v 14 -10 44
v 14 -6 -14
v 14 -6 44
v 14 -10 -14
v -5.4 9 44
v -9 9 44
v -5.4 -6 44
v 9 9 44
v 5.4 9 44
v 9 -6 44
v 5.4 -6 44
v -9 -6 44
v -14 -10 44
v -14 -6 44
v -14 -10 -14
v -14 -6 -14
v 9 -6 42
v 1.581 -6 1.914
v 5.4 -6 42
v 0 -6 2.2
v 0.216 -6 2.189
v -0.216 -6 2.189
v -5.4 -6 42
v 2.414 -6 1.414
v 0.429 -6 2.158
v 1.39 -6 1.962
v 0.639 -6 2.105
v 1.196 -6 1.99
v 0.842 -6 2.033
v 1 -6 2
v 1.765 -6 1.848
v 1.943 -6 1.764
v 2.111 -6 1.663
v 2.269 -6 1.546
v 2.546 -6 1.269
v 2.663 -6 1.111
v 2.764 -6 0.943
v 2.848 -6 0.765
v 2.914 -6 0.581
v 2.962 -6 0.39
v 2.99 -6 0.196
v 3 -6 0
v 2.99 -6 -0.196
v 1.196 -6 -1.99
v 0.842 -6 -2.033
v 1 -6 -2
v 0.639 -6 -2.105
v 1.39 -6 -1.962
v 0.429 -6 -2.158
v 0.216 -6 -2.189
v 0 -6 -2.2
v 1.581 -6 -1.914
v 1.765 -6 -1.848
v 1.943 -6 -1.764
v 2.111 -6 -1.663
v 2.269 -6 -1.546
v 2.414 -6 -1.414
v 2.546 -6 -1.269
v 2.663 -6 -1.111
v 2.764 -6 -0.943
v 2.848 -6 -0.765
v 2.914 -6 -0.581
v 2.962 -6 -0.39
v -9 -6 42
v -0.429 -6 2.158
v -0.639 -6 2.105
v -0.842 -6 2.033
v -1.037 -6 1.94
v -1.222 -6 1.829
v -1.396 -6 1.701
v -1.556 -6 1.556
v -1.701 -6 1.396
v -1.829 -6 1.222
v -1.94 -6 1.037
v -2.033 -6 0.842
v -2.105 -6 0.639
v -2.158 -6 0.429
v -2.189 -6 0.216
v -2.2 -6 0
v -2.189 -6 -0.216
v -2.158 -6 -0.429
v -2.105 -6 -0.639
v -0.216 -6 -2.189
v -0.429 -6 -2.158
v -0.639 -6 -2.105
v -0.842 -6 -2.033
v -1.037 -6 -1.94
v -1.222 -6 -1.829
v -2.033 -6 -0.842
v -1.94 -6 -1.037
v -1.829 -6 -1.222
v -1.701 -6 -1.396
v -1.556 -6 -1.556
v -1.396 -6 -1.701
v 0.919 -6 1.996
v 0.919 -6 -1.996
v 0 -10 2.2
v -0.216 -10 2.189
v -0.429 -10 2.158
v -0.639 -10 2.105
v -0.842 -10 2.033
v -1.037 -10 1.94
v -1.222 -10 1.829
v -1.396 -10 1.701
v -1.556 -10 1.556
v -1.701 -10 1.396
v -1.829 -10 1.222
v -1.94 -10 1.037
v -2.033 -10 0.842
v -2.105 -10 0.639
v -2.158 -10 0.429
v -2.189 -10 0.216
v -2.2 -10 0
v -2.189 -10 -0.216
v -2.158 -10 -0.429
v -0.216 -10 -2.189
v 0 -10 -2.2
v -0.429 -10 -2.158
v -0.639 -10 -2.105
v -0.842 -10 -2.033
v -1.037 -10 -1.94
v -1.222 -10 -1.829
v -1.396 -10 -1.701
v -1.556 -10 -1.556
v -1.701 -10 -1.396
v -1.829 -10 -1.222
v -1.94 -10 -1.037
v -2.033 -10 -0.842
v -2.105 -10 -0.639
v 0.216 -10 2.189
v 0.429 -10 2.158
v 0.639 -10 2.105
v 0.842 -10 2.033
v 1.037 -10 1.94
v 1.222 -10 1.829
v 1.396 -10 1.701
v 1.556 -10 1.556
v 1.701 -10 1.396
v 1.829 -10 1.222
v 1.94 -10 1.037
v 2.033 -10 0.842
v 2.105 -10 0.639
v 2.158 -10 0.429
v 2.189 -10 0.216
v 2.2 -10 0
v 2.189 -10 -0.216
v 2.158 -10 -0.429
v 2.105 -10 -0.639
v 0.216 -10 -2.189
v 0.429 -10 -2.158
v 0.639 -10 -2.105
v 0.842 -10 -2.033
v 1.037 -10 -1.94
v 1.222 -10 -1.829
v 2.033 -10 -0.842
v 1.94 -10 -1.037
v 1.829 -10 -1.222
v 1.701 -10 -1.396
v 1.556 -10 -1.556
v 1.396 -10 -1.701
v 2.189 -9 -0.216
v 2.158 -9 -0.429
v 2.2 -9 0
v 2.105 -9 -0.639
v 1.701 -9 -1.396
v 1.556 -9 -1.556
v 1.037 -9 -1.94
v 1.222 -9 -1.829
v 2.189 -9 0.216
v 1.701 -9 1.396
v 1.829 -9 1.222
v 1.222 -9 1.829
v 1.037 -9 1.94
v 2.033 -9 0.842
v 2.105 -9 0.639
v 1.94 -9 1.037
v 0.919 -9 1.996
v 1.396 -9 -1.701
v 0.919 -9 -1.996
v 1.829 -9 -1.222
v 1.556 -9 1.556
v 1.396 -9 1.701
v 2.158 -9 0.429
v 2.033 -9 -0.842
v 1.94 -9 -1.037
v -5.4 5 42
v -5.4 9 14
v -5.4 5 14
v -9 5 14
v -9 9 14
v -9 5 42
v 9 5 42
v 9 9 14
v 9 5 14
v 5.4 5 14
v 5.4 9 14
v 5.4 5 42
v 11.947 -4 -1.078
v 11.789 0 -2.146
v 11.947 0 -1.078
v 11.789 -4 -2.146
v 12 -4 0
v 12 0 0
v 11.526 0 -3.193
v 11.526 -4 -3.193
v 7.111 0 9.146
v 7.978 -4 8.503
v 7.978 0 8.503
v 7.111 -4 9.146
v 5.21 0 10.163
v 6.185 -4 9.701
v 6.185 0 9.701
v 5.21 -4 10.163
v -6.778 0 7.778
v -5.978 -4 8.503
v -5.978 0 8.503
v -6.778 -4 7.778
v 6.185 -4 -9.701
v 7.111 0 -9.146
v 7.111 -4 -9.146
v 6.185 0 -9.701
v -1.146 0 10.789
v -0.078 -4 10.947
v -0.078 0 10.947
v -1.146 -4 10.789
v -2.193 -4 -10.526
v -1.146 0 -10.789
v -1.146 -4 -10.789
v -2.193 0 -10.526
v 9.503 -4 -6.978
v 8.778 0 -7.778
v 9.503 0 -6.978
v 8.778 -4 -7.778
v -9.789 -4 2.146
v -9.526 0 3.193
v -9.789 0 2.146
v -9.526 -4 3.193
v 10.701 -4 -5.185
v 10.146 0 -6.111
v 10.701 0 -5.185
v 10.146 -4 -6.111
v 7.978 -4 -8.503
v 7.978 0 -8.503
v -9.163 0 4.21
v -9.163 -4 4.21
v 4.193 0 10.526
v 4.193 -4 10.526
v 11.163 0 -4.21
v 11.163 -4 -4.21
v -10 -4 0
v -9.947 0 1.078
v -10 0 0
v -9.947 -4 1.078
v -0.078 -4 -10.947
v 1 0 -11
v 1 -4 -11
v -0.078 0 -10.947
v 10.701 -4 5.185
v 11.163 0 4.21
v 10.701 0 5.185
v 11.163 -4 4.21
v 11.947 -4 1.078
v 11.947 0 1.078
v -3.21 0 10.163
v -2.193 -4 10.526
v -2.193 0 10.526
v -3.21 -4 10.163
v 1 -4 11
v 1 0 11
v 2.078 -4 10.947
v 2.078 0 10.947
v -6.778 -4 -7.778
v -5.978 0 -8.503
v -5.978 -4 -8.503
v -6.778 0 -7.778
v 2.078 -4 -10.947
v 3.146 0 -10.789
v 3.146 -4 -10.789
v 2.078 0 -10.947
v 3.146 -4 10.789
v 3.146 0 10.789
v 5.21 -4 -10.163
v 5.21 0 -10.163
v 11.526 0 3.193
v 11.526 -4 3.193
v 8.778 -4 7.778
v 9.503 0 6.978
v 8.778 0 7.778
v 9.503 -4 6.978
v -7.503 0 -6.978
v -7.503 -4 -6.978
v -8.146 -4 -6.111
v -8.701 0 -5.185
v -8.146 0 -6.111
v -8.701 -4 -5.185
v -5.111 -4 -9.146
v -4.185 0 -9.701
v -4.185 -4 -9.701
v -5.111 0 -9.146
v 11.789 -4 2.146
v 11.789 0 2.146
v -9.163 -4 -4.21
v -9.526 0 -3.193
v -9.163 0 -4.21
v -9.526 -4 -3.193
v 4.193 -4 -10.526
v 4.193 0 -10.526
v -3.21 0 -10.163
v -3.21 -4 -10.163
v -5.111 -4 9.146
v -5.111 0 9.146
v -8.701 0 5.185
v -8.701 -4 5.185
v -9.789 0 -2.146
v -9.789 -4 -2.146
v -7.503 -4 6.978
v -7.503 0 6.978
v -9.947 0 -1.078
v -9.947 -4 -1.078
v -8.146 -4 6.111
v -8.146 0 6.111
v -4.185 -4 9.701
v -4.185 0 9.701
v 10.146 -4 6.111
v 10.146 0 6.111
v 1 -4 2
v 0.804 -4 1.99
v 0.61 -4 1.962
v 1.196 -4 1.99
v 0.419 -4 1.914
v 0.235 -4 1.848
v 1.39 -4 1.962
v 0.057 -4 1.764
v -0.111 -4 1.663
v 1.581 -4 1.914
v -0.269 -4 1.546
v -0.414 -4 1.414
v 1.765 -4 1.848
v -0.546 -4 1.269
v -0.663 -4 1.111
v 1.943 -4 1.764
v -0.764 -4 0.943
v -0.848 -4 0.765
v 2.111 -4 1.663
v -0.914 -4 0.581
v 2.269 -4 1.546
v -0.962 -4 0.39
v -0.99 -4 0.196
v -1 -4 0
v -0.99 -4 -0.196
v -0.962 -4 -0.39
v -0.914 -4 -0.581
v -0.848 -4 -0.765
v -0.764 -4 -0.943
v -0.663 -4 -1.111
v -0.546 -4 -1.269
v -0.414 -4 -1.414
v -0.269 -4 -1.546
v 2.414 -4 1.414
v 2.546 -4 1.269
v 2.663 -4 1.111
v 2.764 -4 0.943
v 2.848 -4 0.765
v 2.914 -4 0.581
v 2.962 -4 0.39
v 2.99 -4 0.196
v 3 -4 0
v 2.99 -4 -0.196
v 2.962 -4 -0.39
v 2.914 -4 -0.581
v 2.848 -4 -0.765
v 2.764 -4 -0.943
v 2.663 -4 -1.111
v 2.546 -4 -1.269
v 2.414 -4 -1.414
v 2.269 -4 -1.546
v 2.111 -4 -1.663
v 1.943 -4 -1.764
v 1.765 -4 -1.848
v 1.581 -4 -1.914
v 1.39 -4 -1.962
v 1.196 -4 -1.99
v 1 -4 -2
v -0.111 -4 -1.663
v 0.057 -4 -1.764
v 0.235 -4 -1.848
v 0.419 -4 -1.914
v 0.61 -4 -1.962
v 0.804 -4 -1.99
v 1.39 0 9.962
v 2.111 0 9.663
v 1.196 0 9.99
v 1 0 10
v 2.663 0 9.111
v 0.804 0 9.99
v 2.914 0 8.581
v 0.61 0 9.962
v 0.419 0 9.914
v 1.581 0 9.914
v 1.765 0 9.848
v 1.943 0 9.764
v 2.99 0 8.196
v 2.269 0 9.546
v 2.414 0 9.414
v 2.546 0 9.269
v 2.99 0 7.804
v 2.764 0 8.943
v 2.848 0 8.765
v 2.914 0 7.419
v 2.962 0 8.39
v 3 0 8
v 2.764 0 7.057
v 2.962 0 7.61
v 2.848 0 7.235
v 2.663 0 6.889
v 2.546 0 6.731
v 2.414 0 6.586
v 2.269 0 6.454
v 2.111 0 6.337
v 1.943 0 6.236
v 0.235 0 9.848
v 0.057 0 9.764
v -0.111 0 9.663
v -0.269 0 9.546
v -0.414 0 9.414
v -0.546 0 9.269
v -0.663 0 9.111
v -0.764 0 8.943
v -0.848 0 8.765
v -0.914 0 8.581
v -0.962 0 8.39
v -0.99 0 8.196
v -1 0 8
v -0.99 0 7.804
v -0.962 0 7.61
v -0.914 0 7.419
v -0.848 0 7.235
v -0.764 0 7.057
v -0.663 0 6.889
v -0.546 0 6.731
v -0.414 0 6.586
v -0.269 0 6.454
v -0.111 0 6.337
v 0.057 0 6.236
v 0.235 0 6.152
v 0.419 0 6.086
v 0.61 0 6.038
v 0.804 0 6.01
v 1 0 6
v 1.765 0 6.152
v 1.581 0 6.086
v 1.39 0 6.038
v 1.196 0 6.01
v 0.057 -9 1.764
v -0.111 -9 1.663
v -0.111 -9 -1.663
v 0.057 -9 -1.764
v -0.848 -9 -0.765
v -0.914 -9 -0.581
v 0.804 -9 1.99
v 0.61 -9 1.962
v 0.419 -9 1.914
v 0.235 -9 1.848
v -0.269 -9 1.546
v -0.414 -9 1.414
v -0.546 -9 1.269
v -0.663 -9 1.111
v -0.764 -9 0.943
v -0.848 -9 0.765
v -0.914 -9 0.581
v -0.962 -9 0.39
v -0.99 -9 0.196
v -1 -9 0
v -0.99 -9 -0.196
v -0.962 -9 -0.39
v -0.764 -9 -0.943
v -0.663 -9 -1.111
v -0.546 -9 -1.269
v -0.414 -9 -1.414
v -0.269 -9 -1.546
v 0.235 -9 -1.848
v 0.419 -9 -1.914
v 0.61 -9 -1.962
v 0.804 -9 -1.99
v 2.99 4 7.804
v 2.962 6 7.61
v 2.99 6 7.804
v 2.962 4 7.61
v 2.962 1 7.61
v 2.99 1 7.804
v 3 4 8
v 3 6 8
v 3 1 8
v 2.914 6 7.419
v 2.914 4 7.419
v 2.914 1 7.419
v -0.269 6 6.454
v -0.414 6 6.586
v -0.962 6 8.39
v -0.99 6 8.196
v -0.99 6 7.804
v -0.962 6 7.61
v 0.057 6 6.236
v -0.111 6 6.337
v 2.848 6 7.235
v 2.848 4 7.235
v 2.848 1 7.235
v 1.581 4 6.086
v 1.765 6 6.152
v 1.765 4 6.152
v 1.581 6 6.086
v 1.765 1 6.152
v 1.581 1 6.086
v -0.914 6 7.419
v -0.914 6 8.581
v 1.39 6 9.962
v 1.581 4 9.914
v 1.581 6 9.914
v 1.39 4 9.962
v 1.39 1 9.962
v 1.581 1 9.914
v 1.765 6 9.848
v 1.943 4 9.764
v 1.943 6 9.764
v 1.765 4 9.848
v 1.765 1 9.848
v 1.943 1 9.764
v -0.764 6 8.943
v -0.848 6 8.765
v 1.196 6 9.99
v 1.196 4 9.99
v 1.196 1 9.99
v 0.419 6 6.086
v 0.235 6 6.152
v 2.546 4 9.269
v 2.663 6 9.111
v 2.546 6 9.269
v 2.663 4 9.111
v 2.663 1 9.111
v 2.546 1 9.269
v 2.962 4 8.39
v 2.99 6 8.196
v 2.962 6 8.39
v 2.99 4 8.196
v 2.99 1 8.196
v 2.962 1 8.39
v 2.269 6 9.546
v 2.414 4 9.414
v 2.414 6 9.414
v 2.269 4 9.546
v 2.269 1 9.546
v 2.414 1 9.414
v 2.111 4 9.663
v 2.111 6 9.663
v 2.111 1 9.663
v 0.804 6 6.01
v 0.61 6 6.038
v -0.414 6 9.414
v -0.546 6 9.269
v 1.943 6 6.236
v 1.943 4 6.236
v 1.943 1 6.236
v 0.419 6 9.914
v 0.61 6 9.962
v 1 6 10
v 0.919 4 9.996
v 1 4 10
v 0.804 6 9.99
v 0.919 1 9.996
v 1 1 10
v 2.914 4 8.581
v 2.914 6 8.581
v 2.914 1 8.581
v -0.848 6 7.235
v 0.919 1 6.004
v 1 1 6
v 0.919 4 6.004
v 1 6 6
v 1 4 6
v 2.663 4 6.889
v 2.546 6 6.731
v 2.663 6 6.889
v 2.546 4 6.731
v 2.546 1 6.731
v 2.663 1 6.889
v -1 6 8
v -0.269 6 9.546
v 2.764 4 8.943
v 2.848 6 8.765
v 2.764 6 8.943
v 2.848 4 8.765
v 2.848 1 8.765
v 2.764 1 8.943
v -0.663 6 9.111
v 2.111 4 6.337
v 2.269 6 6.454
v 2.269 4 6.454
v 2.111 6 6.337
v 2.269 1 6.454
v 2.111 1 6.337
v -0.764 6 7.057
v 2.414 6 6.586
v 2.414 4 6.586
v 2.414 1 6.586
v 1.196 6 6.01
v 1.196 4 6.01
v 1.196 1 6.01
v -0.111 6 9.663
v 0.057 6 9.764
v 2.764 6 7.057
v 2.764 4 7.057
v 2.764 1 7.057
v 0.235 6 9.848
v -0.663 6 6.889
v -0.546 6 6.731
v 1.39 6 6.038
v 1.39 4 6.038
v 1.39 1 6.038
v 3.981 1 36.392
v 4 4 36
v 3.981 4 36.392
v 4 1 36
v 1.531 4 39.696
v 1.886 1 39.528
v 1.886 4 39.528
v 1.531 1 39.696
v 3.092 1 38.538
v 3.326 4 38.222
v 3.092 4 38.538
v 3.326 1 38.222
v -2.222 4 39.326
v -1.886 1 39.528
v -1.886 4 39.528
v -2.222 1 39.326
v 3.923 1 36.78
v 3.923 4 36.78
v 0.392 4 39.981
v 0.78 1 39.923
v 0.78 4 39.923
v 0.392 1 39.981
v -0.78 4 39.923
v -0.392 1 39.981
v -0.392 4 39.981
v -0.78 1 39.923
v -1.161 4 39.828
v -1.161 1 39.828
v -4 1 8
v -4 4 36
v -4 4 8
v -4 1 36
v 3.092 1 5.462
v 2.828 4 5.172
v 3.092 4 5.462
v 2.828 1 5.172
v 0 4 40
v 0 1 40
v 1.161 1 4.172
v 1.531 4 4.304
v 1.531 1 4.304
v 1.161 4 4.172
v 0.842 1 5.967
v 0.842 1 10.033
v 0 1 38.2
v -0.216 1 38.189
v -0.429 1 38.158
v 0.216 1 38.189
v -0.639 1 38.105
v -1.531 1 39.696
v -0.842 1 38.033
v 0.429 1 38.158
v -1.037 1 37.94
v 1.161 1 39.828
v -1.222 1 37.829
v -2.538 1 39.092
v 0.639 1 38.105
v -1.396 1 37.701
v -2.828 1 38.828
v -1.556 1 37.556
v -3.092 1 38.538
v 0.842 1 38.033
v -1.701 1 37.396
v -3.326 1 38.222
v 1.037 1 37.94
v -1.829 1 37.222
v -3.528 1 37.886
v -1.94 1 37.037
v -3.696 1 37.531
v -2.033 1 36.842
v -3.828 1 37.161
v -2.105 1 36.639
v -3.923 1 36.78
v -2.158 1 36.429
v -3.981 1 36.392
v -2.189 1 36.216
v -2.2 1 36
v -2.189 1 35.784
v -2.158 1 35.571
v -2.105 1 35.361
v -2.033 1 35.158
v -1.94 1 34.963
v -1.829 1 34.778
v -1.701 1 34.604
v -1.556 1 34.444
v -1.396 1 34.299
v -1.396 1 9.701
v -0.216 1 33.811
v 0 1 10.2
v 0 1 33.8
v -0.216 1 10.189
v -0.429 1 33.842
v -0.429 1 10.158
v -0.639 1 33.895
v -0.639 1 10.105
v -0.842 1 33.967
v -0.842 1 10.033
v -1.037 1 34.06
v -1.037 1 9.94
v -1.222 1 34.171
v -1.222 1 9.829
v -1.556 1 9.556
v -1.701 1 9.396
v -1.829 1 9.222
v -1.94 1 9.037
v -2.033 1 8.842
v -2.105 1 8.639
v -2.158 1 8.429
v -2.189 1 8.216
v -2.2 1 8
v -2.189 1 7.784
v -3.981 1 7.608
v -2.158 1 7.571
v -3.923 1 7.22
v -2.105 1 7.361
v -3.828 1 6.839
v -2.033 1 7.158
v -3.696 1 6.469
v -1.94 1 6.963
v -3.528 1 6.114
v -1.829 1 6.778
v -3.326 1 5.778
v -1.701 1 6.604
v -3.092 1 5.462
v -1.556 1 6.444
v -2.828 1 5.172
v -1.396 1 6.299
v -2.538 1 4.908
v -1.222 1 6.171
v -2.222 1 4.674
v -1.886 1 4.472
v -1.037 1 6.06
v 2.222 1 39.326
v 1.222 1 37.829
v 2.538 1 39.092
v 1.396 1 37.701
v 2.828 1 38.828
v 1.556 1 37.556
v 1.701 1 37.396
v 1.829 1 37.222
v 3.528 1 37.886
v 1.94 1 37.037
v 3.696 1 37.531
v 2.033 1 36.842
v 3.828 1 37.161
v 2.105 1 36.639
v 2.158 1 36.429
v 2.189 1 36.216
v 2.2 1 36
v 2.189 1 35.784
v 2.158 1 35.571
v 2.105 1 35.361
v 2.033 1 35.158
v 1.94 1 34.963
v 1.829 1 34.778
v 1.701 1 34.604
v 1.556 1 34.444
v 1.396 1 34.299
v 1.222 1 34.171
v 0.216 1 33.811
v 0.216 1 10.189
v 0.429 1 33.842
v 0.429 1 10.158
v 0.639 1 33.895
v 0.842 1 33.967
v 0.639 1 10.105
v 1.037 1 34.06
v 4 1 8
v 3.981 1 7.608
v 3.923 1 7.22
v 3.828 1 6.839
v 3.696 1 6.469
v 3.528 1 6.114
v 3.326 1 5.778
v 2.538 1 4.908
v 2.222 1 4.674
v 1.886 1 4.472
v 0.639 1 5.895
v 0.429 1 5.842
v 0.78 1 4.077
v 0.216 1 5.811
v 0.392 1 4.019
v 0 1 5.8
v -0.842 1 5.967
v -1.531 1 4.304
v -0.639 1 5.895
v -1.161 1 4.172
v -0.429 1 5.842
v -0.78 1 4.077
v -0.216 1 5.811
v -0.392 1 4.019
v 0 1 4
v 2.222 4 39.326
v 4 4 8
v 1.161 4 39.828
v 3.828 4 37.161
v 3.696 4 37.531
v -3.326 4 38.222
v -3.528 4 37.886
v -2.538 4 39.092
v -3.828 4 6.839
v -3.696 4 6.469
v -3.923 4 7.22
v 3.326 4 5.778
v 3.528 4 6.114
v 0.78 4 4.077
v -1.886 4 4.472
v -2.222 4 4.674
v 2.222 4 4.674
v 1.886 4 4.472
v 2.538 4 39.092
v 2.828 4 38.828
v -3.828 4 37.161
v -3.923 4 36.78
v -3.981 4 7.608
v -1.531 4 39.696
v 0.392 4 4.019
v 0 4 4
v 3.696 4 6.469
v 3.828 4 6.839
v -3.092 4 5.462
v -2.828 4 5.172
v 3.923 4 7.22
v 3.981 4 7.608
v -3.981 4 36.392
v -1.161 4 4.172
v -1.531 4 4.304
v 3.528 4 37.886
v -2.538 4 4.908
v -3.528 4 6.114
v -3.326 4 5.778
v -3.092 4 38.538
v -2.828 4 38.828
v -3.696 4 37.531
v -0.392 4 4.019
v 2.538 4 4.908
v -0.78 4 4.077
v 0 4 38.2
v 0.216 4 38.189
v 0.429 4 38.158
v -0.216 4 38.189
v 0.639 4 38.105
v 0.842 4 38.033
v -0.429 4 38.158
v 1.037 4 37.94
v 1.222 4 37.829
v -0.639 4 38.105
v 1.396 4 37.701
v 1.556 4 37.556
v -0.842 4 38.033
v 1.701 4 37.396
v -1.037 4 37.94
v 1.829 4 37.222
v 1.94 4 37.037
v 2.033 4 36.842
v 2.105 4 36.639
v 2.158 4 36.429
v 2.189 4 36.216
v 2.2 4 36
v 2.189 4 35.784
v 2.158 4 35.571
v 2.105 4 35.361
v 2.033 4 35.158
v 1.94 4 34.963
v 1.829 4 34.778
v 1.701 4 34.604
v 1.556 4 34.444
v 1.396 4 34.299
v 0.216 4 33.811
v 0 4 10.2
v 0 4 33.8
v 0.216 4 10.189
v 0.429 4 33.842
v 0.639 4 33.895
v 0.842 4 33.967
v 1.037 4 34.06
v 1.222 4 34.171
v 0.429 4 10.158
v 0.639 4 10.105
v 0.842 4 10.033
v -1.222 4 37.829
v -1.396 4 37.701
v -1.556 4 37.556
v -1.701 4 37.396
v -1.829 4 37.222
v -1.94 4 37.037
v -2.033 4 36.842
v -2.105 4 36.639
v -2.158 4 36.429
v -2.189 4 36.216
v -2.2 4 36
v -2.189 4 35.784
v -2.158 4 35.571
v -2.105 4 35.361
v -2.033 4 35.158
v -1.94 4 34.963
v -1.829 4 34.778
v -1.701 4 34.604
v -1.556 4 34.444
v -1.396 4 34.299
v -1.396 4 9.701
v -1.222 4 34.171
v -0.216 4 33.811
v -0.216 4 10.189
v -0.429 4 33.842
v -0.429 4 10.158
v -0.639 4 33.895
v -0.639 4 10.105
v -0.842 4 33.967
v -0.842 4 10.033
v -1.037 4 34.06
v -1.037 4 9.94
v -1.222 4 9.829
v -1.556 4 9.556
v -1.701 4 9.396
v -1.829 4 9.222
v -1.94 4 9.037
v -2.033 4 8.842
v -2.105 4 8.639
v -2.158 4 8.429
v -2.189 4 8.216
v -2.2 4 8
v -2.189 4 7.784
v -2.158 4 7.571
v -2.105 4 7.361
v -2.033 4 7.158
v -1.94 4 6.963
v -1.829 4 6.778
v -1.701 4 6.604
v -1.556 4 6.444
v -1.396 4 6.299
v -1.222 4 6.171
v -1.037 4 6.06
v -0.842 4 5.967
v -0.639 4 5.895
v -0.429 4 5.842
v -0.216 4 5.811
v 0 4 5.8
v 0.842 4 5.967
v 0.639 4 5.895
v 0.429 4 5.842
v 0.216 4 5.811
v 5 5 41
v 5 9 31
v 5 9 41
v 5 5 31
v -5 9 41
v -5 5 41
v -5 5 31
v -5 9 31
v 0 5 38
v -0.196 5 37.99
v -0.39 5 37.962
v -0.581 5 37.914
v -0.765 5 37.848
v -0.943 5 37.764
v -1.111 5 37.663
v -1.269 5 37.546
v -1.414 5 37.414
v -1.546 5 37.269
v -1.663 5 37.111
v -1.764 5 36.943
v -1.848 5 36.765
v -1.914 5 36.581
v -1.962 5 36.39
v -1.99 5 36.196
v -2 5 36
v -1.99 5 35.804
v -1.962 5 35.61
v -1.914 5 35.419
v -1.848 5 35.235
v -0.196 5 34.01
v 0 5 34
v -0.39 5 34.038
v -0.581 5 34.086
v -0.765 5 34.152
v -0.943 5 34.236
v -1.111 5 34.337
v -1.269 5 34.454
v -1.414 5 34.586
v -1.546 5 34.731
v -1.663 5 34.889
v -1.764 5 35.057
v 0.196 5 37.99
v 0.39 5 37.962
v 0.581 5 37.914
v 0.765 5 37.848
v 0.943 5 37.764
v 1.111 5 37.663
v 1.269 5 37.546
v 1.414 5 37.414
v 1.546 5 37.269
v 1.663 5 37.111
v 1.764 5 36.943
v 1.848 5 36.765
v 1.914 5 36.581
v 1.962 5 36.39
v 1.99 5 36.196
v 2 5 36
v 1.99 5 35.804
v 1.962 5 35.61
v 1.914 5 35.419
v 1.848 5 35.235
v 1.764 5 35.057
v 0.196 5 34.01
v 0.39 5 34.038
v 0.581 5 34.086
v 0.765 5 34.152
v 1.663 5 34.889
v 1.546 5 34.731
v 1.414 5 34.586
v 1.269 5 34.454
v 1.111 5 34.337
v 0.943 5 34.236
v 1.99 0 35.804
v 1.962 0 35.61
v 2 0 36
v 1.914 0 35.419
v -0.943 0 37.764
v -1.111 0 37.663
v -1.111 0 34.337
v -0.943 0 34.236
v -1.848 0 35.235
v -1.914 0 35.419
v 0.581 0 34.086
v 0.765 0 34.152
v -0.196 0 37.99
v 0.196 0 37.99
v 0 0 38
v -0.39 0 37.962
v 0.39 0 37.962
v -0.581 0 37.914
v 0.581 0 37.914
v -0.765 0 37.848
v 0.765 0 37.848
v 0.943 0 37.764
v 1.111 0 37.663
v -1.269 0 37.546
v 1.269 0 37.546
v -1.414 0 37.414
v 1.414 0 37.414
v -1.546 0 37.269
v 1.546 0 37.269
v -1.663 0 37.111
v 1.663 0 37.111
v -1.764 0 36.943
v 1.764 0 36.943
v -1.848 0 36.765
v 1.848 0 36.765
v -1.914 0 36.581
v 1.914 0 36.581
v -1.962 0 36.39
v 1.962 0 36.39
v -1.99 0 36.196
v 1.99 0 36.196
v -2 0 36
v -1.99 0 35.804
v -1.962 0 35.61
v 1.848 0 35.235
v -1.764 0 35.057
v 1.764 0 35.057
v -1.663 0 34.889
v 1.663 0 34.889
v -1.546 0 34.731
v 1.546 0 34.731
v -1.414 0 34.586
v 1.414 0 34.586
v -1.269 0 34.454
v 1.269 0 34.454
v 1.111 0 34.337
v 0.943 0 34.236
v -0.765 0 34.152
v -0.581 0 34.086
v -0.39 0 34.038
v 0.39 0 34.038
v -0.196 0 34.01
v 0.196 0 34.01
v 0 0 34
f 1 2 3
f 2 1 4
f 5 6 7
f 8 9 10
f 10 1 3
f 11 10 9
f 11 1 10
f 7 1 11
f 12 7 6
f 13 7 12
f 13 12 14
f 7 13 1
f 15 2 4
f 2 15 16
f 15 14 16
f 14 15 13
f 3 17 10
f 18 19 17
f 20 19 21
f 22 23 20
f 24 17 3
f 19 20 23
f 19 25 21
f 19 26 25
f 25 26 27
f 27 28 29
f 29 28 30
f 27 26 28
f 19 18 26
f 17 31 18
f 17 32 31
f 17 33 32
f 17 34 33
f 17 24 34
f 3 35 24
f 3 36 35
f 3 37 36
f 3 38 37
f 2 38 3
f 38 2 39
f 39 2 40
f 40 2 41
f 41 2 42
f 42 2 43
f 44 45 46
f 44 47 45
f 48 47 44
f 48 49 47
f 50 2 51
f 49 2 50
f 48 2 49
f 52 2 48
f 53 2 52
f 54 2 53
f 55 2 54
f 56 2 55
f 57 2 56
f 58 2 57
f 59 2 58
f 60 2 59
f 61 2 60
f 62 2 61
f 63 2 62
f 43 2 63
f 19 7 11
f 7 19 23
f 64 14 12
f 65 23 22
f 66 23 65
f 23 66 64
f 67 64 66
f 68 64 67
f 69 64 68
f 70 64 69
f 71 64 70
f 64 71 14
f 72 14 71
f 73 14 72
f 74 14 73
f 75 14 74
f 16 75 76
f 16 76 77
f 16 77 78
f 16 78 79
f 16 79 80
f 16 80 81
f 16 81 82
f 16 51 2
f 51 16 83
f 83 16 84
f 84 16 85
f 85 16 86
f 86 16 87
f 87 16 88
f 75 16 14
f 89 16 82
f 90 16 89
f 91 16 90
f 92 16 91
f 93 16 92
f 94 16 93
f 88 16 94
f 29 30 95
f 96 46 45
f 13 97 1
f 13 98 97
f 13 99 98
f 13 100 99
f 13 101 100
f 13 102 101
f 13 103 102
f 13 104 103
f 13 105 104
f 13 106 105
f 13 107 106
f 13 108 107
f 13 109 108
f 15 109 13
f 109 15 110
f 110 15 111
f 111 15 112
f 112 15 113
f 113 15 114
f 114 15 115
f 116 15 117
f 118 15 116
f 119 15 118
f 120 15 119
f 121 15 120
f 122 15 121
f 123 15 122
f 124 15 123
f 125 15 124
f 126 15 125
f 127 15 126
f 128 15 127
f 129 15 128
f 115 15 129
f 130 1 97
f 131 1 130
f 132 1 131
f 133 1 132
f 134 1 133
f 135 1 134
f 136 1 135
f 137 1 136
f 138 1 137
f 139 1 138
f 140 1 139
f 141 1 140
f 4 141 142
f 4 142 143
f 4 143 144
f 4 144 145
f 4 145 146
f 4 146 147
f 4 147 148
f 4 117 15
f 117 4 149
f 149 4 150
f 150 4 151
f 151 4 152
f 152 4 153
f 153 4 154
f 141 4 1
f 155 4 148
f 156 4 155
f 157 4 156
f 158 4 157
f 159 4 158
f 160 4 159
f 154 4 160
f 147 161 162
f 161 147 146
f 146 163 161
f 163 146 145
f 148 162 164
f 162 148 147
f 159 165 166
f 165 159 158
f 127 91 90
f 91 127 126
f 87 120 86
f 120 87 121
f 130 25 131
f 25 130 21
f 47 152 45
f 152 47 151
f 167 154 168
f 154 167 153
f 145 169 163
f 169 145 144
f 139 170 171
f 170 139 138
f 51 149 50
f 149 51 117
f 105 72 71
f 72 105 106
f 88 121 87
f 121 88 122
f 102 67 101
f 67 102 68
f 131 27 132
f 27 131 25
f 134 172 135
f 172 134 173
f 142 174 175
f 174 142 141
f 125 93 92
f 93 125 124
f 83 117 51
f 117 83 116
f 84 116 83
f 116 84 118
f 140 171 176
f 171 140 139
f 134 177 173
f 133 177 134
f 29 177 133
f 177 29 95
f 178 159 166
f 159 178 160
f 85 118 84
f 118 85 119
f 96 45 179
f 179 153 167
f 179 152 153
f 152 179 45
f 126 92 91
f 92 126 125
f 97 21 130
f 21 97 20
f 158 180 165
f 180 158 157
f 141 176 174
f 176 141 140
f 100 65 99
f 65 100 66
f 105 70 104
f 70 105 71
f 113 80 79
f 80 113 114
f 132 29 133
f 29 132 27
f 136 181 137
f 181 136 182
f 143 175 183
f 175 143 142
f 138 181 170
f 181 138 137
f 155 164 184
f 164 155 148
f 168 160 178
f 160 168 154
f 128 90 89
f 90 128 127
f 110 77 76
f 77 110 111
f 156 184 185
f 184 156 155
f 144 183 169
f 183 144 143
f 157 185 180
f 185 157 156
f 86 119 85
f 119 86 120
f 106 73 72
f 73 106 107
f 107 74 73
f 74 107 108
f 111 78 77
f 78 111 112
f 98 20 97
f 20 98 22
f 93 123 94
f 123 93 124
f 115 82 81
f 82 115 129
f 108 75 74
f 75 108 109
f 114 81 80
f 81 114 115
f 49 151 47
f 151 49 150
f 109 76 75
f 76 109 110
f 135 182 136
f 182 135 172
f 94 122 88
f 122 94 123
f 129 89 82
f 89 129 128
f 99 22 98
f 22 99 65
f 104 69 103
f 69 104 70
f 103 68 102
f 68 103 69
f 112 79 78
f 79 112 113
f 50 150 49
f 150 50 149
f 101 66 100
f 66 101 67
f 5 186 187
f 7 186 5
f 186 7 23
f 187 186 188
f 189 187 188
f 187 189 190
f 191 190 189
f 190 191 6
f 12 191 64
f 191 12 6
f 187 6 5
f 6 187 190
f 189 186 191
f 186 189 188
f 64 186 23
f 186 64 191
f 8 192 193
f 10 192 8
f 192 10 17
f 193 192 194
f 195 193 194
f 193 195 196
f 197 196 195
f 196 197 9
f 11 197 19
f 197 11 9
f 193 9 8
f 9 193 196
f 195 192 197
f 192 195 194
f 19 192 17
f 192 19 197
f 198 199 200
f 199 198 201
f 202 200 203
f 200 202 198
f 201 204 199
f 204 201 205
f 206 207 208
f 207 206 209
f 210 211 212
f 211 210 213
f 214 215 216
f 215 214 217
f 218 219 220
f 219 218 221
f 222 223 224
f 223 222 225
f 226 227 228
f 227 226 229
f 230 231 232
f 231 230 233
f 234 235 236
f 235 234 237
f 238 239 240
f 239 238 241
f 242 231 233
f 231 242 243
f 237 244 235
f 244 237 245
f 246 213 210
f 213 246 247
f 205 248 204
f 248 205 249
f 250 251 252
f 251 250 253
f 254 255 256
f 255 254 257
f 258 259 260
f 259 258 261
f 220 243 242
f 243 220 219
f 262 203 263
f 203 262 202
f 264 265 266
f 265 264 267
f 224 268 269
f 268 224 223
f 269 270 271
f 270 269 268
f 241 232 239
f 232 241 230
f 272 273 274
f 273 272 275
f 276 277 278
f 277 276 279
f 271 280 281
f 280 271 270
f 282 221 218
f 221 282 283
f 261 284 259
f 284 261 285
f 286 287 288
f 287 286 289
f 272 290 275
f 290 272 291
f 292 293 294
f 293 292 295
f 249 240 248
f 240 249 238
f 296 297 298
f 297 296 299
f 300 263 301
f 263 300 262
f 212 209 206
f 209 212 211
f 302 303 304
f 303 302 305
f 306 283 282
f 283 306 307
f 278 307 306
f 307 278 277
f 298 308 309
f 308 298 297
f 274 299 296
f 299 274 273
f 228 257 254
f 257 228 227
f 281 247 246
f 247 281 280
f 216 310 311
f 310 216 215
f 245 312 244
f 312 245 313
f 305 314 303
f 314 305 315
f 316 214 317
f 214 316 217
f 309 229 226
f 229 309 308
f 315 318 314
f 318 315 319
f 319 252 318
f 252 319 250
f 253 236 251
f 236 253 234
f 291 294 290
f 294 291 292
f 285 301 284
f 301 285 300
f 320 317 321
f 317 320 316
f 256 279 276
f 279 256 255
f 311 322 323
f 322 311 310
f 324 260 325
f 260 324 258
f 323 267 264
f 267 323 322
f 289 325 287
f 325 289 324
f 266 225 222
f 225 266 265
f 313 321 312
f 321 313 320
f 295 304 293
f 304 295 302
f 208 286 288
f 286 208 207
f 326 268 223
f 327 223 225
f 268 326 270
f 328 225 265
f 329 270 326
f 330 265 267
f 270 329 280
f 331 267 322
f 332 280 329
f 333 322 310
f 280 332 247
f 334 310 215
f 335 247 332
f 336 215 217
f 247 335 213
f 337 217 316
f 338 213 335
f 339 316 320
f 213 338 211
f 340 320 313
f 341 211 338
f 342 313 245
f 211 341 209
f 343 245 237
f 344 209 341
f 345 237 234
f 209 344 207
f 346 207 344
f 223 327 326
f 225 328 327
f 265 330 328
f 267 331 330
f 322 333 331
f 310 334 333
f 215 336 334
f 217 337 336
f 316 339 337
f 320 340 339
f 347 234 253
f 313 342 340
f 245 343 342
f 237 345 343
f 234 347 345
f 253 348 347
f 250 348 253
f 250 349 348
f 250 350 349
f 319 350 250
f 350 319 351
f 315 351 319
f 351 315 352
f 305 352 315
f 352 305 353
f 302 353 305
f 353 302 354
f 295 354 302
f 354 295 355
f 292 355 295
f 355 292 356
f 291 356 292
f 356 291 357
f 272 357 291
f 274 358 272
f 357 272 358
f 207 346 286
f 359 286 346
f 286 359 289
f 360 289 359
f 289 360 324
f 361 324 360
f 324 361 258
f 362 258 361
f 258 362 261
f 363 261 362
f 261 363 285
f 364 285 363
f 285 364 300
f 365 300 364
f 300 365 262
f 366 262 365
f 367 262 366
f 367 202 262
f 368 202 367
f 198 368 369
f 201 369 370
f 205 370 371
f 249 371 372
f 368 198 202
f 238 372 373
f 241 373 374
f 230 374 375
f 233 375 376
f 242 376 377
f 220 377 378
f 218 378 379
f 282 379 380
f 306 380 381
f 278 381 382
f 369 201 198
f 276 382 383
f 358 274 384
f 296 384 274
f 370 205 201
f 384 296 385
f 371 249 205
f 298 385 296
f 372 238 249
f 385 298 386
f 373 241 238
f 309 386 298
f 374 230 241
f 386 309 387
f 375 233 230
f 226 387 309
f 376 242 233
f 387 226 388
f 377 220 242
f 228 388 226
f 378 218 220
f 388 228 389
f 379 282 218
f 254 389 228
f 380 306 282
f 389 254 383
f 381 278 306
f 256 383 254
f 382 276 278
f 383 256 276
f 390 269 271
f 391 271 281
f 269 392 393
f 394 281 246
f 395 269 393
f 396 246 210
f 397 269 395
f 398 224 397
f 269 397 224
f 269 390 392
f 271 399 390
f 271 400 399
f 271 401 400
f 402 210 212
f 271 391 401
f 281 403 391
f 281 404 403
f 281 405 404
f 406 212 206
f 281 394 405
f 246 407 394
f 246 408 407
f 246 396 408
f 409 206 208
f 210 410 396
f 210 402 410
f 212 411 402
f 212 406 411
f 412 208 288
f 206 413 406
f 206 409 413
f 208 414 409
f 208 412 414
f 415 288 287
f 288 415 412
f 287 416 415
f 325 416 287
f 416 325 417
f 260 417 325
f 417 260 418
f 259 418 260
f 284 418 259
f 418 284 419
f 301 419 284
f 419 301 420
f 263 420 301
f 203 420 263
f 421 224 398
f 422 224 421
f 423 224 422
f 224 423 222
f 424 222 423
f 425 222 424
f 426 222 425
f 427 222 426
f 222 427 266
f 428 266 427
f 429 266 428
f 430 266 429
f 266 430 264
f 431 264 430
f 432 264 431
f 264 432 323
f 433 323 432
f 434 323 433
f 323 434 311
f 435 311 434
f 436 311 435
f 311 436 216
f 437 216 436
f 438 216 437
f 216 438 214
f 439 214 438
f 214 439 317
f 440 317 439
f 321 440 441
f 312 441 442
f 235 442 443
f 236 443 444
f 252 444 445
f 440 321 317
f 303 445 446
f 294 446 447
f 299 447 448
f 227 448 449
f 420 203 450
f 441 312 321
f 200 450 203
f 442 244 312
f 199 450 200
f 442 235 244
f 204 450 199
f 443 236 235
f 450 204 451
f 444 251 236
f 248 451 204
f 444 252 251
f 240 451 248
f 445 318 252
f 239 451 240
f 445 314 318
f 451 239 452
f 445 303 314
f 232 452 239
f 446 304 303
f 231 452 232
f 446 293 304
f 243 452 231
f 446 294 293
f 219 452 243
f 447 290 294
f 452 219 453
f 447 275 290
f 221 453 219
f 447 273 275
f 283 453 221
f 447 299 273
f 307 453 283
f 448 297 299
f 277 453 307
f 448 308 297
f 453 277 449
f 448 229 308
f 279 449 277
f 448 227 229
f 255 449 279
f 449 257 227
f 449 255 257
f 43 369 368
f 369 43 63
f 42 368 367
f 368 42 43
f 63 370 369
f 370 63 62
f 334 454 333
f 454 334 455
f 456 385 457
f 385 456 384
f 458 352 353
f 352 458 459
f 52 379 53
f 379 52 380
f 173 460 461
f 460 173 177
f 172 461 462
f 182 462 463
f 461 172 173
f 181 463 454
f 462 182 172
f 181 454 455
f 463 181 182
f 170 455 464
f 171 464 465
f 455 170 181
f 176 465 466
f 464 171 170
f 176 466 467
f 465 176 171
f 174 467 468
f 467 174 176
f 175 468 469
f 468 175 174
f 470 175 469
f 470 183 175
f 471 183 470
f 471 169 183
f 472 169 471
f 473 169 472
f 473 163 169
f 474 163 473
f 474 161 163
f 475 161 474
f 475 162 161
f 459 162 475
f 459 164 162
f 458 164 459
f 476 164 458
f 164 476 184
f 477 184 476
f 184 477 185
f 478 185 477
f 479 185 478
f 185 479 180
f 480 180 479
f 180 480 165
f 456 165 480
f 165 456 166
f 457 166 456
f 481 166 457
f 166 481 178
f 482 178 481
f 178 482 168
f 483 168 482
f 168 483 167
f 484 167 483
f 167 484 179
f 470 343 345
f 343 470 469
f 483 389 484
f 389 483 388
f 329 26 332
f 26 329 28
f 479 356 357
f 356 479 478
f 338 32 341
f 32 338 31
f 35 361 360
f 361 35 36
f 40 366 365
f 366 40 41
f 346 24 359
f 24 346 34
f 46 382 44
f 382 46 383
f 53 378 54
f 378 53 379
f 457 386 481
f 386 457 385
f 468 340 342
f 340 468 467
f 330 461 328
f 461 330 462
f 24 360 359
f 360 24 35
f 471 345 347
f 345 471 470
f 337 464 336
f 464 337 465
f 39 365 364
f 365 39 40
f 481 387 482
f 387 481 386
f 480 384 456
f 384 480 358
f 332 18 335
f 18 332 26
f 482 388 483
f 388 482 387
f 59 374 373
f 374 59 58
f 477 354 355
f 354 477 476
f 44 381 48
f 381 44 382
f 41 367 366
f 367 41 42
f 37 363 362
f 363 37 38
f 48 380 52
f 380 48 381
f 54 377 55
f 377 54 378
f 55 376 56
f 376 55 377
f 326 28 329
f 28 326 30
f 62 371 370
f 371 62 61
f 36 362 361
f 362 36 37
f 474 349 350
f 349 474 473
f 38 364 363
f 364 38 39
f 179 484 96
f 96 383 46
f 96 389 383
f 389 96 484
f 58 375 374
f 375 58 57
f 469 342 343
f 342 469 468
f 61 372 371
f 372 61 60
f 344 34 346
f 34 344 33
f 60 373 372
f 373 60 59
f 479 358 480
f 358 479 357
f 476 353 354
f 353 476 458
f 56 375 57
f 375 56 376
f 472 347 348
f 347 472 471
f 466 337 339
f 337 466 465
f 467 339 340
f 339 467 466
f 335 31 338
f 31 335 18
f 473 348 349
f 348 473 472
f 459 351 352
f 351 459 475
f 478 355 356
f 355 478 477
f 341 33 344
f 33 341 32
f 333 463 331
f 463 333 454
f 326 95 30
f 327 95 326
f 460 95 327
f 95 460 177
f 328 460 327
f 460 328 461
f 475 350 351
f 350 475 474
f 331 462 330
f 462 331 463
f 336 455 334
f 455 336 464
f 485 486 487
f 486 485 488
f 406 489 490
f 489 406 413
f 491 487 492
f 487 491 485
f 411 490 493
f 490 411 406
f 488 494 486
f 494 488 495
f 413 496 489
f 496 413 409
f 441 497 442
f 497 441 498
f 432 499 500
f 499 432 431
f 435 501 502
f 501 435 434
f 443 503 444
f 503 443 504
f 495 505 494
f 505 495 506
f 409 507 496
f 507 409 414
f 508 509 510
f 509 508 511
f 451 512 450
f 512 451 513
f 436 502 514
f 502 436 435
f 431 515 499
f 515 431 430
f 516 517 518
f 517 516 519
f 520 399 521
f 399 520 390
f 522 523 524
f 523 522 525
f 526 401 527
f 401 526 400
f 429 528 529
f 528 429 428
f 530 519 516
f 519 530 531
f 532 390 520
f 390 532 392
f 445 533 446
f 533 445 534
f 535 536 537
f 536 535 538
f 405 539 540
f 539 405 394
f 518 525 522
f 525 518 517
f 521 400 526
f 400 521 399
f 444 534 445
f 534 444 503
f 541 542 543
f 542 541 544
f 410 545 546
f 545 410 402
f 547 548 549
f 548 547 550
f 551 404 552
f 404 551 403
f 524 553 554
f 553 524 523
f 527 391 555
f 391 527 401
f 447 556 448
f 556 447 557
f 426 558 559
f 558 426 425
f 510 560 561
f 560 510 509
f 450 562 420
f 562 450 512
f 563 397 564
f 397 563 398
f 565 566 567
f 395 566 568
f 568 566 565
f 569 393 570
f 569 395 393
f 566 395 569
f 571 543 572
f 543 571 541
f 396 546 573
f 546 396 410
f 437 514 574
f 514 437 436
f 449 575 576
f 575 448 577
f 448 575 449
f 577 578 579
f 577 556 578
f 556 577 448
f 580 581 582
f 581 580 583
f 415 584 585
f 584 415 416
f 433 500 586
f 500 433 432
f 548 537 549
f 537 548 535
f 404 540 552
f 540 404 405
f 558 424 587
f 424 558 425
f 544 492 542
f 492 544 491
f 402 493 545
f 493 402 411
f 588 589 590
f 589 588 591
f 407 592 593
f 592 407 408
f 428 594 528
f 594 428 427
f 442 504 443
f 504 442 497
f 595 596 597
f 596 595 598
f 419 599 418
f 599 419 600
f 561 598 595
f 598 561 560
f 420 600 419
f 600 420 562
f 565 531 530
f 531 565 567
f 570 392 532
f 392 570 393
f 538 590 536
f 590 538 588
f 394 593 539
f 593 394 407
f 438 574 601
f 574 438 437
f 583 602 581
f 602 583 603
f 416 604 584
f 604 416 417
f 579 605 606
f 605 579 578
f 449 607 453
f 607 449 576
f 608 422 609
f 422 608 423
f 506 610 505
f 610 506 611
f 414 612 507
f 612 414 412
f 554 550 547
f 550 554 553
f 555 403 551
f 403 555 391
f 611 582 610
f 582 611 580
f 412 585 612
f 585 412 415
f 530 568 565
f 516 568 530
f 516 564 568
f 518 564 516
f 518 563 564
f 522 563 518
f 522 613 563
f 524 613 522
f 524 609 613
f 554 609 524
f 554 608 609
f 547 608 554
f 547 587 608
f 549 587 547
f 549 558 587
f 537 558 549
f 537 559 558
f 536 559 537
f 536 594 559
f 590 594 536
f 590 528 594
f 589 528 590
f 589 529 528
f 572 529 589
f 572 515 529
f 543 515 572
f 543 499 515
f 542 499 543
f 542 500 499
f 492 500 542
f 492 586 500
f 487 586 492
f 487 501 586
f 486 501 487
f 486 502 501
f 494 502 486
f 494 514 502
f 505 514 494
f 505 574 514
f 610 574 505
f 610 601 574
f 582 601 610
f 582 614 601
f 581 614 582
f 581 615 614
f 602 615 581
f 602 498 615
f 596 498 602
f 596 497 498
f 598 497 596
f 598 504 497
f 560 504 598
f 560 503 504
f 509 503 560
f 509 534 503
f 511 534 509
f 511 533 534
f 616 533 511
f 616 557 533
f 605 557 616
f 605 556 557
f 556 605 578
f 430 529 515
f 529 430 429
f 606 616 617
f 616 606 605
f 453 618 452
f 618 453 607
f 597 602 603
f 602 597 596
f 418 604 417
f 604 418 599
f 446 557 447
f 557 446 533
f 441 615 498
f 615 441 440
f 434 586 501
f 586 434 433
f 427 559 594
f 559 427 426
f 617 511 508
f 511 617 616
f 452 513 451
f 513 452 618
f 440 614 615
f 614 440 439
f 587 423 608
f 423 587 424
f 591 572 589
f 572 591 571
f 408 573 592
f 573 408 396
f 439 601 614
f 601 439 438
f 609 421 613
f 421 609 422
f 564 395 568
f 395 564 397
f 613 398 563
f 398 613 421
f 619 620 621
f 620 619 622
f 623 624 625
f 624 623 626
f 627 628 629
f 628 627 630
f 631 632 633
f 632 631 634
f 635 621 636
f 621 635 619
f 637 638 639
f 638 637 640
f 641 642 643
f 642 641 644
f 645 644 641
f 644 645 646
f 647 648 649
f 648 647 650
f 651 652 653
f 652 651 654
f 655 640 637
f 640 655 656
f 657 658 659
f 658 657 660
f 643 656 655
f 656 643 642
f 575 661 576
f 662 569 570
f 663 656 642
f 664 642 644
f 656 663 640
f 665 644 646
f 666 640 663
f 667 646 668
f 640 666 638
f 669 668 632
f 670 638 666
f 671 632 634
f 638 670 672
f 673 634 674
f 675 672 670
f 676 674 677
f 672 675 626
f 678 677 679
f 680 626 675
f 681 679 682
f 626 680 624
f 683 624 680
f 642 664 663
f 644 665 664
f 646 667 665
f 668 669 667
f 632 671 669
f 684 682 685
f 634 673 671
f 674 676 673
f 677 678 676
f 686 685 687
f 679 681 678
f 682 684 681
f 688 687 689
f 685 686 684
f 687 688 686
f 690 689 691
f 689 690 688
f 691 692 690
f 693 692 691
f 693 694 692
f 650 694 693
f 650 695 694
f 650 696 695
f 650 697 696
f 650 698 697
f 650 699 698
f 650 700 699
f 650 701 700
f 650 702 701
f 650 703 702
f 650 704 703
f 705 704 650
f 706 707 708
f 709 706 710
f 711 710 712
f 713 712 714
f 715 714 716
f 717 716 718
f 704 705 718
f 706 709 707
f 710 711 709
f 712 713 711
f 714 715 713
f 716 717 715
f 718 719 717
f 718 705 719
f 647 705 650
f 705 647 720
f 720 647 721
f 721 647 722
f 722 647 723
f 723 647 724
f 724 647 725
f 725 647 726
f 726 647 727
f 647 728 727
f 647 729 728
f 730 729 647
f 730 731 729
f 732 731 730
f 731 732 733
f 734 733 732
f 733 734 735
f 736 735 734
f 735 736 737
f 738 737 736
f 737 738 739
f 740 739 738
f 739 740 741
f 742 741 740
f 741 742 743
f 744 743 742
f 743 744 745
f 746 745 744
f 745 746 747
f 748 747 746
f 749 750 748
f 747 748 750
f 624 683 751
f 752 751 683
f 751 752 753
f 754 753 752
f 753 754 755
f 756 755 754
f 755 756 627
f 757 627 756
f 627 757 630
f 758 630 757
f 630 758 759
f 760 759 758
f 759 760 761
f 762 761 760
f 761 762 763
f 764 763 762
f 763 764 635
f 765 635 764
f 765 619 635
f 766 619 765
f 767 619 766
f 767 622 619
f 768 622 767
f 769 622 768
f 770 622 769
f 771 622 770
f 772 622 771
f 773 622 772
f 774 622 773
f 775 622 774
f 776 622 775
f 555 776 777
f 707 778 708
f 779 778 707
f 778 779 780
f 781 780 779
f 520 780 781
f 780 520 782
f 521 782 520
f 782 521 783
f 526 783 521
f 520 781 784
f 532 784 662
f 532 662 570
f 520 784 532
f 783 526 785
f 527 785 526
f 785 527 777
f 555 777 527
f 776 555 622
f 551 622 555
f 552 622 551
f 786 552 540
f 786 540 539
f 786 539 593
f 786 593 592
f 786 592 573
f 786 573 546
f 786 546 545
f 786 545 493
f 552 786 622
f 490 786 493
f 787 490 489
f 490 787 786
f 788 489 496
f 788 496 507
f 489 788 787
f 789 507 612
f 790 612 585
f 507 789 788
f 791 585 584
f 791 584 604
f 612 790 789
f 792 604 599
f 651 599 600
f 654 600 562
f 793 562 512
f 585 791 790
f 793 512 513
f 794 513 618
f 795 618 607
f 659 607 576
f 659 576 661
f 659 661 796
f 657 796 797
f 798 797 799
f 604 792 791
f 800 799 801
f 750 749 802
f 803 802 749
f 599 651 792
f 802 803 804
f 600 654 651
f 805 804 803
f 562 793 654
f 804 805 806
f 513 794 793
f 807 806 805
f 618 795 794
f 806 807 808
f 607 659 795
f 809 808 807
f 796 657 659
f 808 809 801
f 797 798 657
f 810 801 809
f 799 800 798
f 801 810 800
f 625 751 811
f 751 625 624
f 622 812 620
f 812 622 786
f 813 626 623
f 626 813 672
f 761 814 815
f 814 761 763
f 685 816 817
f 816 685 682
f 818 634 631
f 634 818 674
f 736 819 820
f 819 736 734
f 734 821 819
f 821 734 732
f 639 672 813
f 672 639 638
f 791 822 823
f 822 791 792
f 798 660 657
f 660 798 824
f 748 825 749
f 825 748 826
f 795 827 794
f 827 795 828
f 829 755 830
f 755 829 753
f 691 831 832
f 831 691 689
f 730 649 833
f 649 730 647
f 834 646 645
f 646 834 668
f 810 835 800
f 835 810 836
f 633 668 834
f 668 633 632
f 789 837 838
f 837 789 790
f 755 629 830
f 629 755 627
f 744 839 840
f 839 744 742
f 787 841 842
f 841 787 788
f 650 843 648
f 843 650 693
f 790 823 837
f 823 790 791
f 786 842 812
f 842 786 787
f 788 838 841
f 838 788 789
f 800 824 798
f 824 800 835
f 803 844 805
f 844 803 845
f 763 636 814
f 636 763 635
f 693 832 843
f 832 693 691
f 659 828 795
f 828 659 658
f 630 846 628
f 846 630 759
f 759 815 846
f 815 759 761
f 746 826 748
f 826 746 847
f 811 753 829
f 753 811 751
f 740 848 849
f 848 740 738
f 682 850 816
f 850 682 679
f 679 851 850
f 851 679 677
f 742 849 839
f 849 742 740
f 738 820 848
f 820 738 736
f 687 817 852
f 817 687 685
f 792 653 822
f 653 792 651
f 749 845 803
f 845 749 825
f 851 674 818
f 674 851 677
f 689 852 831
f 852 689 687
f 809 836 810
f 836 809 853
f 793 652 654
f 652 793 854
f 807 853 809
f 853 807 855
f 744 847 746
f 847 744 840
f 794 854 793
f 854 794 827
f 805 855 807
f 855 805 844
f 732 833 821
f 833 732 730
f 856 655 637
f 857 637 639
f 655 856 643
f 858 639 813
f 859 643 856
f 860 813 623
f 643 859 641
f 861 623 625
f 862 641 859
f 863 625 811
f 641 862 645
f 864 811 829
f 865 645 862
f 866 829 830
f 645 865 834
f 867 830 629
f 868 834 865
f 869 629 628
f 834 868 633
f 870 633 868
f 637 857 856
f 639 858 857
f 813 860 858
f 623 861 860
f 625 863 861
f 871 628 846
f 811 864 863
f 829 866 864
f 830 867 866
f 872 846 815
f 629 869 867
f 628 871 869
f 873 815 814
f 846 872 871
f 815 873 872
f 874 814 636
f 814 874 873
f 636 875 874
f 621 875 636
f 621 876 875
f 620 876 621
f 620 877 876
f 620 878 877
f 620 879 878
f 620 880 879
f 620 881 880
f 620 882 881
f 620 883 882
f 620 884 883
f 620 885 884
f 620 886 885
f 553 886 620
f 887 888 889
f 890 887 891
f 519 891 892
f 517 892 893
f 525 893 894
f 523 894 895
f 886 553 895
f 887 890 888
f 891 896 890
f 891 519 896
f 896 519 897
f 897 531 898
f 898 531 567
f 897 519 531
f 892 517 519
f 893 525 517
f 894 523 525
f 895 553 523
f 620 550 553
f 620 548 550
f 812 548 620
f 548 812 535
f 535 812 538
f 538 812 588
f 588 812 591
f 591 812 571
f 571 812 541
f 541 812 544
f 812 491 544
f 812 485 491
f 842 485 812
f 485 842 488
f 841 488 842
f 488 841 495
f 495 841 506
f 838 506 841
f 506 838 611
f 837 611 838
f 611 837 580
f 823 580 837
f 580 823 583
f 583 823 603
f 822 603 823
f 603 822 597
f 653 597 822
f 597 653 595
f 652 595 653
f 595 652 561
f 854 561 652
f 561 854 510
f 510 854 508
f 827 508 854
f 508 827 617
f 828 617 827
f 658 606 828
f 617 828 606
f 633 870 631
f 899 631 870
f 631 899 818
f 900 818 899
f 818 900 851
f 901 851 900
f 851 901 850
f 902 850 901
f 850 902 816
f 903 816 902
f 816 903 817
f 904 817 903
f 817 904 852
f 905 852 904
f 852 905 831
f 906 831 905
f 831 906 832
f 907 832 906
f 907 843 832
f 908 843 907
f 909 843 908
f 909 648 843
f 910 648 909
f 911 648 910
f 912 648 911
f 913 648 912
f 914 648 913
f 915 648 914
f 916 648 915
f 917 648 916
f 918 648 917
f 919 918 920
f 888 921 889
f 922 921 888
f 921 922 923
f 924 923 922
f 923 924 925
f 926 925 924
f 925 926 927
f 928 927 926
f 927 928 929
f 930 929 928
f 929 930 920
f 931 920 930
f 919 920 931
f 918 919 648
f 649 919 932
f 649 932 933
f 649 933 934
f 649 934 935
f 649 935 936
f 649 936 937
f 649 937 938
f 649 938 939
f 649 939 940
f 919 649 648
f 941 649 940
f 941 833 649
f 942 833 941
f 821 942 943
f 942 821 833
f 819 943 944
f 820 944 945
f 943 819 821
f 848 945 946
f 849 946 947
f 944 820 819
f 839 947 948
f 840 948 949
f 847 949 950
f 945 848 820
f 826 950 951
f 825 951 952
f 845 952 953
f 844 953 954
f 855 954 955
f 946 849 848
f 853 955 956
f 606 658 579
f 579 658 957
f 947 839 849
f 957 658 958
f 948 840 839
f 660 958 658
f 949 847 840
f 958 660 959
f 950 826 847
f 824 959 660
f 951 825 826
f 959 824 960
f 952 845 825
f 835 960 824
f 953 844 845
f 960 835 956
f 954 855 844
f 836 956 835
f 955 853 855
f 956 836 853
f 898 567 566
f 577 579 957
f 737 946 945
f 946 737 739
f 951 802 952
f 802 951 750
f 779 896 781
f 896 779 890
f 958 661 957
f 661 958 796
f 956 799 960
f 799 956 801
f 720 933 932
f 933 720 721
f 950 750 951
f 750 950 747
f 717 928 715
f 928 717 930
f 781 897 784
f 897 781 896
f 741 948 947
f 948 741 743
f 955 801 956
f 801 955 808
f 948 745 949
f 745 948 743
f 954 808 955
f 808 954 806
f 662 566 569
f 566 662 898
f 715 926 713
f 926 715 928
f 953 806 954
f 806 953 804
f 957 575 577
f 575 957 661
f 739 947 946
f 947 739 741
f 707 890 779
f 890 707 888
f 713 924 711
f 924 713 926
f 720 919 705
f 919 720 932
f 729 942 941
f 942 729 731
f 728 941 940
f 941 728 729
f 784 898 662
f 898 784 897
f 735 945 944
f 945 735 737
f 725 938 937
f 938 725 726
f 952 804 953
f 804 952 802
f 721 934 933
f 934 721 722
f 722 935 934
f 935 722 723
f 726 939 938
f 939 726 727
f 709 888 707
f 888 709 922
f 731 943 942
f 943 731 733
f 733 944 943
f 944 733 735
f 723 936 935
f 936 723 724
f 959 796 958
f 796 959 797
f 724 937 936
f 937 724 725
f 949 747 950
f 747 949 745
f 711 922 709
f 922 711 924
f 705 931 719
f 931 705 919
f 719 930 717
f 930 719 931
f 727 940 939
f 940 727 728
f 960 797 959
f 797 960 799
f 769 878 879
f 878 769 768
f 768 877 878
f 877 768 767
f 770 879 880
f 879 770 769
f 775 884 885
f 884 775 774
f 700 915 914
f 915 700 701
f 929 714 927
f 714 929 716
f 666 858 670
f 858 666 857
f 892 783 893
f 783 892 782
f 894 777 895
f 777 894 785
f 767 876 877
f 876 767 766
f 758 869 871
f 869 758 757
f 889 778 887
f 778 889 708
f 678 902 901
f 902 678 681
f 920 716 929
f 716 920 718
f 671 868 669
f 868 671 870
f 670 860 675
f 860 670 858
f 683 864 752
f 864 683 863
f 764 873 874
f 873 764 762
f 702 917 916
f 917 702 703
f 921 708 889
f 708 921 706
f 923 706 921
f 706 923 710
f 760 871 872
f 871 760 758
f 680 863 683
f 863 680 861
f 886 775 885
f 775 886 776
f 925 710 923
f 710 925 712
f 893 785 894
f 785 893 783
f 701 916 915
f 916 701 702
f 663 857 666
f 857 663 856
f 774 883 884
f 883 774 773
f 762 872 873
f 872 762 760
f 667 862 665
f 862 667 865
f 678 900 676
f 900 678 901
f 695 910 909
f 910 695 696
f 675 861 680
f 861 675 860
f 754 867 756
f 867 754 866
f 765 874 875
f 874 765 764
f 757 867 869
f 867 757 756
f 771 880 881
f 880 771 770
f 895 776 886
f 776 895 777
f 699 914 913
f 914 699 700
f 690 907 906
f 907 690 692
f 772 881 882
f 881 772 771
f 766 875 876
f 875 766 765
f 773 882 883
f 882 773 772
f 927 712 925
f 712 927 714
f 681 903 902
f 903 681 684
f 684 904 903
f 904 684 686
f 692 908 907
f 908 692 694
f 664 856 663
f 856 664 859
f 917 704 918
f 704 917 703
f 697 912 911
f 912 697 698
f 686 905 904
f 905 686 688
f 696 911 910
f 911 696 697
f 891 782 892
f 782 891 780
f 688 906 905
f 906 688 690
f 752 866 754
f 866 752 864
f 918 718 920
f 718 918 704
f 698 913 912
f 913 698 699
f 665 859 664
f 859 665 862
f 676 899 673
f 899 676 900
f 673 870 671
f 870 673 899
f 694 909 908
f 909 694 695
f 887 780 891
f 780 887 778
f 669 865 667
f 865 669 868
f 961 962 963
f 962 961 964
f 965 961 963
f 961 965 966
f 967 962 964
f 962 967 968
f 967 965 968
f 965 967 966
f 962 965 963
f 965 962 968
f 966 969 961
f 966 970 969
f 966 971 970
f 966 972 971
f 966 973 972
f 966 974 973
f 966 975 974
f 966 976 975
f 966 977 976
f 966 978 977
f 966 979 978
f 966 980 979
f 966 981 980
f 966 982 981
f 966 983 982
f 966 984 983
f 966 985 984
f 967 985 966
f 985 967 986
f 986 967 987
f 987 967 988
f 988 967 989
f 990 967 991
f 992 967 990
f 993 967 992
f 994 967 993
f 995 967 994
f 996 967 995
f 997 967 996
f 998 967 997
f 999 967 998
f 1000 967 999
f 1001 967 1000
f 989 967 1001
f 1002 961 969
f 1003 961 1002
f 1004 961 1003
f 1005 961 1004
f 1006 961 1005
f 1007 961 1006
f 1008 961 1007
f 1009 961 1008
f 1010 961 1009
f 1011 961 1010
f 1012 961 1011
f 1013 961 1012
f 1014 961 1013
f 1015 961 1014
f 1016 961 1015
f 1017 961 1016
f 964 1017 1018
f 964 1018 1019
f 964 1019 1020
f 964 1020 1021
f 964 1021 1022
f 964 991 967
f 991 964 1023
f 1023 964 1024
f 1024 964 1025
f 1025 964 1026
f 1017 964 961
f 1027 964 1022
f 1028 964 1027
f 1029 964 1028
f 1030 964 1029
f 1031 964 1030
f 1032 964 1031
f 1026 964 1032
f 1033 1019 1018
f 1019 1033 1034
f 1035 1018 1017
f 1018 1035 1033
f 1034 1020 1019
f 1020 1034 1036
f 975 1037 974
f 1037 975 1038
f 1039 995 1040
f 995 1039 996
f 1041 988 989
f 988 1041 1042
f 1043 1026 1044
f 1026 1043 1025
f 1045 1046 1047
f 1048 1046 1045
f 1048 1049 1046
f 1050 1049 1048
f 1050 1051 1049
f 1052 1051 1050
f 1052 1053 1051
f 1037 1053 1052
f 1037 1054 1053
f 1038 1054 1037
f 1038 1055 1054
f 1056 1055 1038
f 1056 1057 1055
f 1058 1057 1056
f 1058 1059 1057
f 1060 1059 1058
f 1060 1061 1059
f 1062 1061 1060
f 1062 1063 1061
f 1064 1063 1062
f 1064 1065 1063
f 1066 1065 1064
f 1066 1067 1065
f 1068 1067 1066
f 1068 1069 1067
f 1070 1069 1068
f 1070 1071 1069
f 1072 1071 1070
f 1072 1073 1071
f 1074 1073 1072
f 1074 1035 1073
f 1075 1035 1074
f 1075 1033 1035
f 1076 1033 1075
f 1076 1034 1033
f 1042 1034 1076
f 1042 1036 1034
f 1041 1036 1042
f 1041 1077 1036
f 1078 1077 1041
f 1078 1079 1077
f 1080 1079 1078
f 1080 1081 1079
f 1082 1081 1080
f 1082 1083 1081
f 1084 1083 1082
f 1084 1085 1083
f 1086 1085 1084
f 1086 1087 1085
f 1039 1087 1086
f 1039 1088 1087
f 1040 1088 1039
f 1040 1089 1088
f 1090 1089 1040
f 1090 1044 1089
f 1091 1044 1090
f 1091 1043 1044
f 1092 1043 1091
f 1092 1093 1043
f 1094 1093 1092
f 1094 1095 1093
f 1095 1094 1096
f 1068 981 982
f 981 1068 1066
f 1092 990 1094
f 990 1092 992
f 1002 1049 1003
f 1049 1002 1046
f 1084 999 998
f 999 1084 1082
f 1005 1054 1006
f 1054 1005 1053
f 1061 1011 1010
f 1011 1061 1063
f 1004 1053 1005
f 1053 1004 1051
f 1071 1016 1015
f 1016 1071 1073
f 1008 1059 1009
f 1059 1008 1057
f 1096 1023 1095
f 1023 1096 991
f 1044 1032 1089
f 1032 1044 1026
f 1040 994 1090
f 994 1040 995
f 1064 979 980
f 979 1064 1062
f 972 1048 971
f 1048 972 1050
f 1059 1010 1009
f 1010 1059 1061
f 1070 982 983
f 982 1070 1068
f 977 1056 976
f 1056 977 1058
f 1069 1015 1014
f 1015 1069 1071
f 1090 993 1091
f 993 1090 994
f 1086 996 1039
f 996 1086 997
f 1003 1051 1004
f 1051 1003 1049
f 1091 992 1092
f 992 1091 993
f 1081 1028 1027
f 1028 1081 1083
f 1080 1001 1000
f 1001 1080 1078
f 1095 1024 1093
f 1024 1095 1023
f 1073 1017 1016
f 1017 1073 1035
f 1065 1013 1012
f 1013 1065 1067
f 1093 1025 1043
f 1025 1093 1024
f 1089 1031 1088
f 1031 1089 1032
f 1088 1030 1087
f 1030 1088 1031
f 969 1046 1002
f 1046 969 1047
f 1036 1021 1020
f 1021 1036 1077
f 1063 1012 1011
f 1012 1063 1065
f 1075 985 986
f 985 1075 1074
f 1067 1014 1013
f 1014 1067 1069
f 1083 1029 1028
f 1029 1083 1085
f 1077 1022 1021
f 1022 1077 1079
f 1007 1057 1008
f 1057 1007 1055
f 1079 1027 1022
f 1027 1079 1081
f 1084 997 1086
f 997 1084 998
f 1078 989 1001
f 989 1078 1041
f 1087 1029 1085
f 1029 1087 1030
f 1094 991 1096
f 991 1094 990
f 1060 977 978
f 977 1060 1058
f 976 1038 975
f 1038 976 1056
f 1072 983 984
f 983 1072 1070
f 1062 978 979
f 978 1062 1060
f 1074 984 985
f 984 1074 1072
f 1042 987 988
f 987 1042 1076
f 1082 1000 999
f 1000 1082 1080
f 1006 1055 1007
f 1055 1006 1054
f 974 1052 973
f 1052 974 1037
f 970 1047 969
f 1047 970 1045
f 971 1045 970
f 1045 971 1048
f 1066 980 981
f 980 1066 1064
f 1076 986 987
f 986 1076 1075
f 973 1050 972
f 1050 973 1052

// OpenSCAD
// Original low-speed slider-crank verification fixture, millimetres.
// Four manufacturing parts. Pins are integral; external axial retention is
// required. No load capacity, print tolerance or physical function is claimed.
agentscad_part = "all";
agentscad_pose = false;
motion_angle = 0;
crank_radius = 8;
rod_length = 28;
$fn = 64;

// All pin axes are parallel to +Y; the mechanism moves in the XZ plane.
module y_cylinder(radius, height) { rotate([-90, 0, 0]) cylinder(r=radius, h=height); }
module crank_local() {
  union() {
    translate([0, -4, 0]) y_cylinder(crank_radius + 3, 4);
    translate([0, -9, 0]) y_cylinder(2, 5.1);
    translate([0, -0.1, crank_radius]) y_cylinder(2, 6.1);
  }
}
module rod_local() {
  difference() {
    hull() {
      translate([0, 1, 0]) y_cylinder(4, 3);
      translate([0, 1, rod_length]) y_cylinder(4, 3);
    }
    translate([0, 0.9, 0]) y_cylinder(2.2, 3.2);
    translate([0, 0.9, rod_length]) y_cylinder(2.2, 3.2);
  }
}
module slider_local() {
  union() {
    translate([-5, 5, -5]) cube([10, 4, 10]);
    y_cylinder(2, 5.1);
  }
}
module frame_local() {
  union() {
    difference() {
      translate([-14, -10, -14]) cube([28, 4, 58]);
      translate([0, -10.1, 0]) y_cylinder(2.2, 4.2);
    }
    for (x = [-9, 5.4]) {
      translate([x, 5, 14]) cube([3.6, 4, 30]);
      translate([x, -6.1, 42]) cube([3.6, 11.2, 2]);
    }
  }
}

// Source-side construction. The checker measures the resulting mesh contours;
// it never consumes these functions or their computed coordinates as evidence.
cx = crank_radius * sin(motion_angle);
cz = crank_radius * cos(motion_angle);
travel = sqrt(rod_length * rod_length - cx * cx);
pz = cz + travel;
rod_angle = atan2(-cx, travel);
module selected_part(id, placed) {
  if (id == "frame") frame_local();
  if (id == "crank") translate([1, 0, 0]) rotate([0, placed ? motion_angle : 0, 0]) crank_local();
  if (id == "rod") translate(placed ? [cx, 0, cz] : [0, 0, 0])
    rotate([0, placed ? rod_angle : 0, 0]) rod_local();
  if (id == "slider") translate([0, 0, placed ? pz : 0]) slider_local();
}
module generated_part() {
  if (agentscad_part == "all") {
    for (id = ["frame", "crank", "rod", "slider"]) selected_part(id, true);
  } else selected_part(agentscad_part, agentscad_pose);
}
generated_part();
